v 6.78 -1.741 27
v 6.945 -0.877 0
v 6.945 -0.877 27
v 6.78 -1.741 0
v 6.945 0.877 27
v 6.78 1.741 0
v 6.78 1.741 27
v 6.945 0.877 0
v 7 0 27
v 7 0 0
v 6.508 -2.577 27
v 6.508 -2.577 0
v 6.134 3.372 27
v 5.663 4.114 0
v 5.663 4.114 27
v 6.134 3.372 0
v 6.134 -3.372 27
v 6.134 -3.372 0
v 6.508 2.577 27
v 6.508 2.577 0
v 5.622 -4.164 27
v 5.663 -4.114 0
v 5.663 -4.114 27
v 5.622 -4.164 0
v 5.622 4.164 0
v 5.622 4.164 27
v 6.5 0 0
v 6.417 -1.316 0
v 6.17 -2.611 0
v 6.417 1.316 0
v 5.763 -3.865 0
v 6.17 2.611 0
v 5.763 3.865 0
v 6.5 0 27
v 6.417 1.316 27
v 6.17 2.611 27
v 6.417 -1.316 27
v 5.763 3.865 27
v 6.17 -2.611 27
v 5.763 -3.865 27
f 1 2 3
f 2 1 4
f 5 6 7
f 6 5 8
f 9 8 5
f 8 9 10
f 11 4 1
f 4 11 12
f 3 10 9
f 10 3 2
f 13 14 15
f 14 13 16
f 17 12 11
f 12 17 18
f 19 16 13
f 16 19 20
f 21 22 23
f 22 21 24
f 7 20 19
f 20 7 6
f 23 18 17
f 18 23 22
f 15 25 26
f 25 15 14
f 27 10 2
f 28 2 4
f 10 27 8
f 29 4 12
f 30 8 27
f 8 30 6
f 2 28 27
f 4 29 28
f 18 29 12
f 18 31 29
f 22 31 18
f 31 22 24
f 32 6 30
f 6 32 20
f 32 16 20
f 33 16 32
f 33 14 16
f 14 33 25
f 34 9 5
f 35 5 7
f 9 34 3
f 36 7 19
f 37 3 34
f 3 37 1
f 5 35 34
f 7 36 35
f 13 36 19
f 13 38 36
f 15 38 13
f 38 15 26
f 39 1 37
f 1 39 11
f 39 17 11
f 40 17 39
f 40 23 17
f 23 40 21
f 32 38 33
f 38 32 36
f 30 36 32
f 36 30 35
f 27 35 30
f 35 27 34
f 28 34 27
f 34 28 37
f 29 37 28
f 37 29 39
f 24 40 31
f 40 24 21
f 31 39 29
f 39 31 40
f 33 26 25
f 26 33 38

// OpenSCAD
$fn = 50;


difference() {
	union() {
		cylinder(h = 27, r = 7.0000000000);
		translate(v = [-7.0000000000, 0, 0]) {
			cylinder(h = 27, r = 7.0000000000);
		}
	}
	union() {
		cylinder(h = 27, r = 3.2500000000);
		cylinder(h = 27, r = 1.8000000000);
		cylinder(h = 27, r = 1.8000000000);
		cylinder(h = 27, r = 1.8000000000);
		translate(v = [-11.5000000000, 0, 0]) {
			hull() {
				translate(v = [-3.7500000000, 0.0000000000, 0]) {
					cylinder(h = 27, r = 10.5000000000);
				}
				translate(v = [3.7500000000, 0.0000000000, 0]) {
					cylinder(h = 27, r = 10.5000000000);
				}
				translate(v = [-3.7500000000, -0.0000000000, 0]) {
					cylinder(h = 27, r = 10.5000000000);
				}
				translate(v = [3.7500000000, -0.0000000000, 0]) {
					cylinder(h = 27, r = 10.5000000000);
				}
			}
		}
		translate(v = [-4.0000000000, 0, 0.0000000000]) {
			cylinder(h = 27, r = 10.5000000000);
		}
	}
}
